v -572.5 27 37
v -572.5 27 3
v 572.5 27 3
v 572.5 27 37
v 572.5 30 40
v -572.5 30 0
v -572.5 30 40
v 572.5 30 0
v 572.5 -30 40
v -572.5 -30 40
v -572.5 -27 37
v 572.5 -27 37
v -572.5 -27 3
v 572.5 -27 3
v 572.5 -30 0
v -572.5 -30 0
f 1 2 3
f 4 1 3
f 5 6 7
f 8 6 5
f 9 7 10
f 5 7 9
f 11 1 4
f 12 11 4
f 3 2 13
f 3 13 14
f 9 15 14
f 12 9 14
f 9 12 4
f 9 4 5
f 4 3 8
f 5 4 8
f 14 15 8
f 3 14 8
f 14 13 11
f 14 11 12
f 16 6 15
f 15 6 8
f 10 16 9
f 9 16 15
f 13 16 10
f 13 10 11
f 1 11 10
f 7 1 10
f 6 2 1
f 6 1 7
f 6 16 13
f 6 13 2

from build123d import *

# Parameters (mm, degrees)
F0_W     = 1145
F0_H     = 60
F1_DEPTH = 40
F2_T     = -3


with BuildPart() as f1:
    # F0 (on Top) → F1 (new body)
    with BuildSketch(Plane.XY):
        Rectangle(F0_W, F0_H)
    extrude(amount=F1_DEPTH)

    # F2
    f2_openings = [f1.faces().sort_by_distance(p)[0] for p in [
        (-572.5, 0, 20),
        (572.5, 0, 20),
    ]]
    offset(amount=F2_T, openings=f2_openings)


solid = f1.part
